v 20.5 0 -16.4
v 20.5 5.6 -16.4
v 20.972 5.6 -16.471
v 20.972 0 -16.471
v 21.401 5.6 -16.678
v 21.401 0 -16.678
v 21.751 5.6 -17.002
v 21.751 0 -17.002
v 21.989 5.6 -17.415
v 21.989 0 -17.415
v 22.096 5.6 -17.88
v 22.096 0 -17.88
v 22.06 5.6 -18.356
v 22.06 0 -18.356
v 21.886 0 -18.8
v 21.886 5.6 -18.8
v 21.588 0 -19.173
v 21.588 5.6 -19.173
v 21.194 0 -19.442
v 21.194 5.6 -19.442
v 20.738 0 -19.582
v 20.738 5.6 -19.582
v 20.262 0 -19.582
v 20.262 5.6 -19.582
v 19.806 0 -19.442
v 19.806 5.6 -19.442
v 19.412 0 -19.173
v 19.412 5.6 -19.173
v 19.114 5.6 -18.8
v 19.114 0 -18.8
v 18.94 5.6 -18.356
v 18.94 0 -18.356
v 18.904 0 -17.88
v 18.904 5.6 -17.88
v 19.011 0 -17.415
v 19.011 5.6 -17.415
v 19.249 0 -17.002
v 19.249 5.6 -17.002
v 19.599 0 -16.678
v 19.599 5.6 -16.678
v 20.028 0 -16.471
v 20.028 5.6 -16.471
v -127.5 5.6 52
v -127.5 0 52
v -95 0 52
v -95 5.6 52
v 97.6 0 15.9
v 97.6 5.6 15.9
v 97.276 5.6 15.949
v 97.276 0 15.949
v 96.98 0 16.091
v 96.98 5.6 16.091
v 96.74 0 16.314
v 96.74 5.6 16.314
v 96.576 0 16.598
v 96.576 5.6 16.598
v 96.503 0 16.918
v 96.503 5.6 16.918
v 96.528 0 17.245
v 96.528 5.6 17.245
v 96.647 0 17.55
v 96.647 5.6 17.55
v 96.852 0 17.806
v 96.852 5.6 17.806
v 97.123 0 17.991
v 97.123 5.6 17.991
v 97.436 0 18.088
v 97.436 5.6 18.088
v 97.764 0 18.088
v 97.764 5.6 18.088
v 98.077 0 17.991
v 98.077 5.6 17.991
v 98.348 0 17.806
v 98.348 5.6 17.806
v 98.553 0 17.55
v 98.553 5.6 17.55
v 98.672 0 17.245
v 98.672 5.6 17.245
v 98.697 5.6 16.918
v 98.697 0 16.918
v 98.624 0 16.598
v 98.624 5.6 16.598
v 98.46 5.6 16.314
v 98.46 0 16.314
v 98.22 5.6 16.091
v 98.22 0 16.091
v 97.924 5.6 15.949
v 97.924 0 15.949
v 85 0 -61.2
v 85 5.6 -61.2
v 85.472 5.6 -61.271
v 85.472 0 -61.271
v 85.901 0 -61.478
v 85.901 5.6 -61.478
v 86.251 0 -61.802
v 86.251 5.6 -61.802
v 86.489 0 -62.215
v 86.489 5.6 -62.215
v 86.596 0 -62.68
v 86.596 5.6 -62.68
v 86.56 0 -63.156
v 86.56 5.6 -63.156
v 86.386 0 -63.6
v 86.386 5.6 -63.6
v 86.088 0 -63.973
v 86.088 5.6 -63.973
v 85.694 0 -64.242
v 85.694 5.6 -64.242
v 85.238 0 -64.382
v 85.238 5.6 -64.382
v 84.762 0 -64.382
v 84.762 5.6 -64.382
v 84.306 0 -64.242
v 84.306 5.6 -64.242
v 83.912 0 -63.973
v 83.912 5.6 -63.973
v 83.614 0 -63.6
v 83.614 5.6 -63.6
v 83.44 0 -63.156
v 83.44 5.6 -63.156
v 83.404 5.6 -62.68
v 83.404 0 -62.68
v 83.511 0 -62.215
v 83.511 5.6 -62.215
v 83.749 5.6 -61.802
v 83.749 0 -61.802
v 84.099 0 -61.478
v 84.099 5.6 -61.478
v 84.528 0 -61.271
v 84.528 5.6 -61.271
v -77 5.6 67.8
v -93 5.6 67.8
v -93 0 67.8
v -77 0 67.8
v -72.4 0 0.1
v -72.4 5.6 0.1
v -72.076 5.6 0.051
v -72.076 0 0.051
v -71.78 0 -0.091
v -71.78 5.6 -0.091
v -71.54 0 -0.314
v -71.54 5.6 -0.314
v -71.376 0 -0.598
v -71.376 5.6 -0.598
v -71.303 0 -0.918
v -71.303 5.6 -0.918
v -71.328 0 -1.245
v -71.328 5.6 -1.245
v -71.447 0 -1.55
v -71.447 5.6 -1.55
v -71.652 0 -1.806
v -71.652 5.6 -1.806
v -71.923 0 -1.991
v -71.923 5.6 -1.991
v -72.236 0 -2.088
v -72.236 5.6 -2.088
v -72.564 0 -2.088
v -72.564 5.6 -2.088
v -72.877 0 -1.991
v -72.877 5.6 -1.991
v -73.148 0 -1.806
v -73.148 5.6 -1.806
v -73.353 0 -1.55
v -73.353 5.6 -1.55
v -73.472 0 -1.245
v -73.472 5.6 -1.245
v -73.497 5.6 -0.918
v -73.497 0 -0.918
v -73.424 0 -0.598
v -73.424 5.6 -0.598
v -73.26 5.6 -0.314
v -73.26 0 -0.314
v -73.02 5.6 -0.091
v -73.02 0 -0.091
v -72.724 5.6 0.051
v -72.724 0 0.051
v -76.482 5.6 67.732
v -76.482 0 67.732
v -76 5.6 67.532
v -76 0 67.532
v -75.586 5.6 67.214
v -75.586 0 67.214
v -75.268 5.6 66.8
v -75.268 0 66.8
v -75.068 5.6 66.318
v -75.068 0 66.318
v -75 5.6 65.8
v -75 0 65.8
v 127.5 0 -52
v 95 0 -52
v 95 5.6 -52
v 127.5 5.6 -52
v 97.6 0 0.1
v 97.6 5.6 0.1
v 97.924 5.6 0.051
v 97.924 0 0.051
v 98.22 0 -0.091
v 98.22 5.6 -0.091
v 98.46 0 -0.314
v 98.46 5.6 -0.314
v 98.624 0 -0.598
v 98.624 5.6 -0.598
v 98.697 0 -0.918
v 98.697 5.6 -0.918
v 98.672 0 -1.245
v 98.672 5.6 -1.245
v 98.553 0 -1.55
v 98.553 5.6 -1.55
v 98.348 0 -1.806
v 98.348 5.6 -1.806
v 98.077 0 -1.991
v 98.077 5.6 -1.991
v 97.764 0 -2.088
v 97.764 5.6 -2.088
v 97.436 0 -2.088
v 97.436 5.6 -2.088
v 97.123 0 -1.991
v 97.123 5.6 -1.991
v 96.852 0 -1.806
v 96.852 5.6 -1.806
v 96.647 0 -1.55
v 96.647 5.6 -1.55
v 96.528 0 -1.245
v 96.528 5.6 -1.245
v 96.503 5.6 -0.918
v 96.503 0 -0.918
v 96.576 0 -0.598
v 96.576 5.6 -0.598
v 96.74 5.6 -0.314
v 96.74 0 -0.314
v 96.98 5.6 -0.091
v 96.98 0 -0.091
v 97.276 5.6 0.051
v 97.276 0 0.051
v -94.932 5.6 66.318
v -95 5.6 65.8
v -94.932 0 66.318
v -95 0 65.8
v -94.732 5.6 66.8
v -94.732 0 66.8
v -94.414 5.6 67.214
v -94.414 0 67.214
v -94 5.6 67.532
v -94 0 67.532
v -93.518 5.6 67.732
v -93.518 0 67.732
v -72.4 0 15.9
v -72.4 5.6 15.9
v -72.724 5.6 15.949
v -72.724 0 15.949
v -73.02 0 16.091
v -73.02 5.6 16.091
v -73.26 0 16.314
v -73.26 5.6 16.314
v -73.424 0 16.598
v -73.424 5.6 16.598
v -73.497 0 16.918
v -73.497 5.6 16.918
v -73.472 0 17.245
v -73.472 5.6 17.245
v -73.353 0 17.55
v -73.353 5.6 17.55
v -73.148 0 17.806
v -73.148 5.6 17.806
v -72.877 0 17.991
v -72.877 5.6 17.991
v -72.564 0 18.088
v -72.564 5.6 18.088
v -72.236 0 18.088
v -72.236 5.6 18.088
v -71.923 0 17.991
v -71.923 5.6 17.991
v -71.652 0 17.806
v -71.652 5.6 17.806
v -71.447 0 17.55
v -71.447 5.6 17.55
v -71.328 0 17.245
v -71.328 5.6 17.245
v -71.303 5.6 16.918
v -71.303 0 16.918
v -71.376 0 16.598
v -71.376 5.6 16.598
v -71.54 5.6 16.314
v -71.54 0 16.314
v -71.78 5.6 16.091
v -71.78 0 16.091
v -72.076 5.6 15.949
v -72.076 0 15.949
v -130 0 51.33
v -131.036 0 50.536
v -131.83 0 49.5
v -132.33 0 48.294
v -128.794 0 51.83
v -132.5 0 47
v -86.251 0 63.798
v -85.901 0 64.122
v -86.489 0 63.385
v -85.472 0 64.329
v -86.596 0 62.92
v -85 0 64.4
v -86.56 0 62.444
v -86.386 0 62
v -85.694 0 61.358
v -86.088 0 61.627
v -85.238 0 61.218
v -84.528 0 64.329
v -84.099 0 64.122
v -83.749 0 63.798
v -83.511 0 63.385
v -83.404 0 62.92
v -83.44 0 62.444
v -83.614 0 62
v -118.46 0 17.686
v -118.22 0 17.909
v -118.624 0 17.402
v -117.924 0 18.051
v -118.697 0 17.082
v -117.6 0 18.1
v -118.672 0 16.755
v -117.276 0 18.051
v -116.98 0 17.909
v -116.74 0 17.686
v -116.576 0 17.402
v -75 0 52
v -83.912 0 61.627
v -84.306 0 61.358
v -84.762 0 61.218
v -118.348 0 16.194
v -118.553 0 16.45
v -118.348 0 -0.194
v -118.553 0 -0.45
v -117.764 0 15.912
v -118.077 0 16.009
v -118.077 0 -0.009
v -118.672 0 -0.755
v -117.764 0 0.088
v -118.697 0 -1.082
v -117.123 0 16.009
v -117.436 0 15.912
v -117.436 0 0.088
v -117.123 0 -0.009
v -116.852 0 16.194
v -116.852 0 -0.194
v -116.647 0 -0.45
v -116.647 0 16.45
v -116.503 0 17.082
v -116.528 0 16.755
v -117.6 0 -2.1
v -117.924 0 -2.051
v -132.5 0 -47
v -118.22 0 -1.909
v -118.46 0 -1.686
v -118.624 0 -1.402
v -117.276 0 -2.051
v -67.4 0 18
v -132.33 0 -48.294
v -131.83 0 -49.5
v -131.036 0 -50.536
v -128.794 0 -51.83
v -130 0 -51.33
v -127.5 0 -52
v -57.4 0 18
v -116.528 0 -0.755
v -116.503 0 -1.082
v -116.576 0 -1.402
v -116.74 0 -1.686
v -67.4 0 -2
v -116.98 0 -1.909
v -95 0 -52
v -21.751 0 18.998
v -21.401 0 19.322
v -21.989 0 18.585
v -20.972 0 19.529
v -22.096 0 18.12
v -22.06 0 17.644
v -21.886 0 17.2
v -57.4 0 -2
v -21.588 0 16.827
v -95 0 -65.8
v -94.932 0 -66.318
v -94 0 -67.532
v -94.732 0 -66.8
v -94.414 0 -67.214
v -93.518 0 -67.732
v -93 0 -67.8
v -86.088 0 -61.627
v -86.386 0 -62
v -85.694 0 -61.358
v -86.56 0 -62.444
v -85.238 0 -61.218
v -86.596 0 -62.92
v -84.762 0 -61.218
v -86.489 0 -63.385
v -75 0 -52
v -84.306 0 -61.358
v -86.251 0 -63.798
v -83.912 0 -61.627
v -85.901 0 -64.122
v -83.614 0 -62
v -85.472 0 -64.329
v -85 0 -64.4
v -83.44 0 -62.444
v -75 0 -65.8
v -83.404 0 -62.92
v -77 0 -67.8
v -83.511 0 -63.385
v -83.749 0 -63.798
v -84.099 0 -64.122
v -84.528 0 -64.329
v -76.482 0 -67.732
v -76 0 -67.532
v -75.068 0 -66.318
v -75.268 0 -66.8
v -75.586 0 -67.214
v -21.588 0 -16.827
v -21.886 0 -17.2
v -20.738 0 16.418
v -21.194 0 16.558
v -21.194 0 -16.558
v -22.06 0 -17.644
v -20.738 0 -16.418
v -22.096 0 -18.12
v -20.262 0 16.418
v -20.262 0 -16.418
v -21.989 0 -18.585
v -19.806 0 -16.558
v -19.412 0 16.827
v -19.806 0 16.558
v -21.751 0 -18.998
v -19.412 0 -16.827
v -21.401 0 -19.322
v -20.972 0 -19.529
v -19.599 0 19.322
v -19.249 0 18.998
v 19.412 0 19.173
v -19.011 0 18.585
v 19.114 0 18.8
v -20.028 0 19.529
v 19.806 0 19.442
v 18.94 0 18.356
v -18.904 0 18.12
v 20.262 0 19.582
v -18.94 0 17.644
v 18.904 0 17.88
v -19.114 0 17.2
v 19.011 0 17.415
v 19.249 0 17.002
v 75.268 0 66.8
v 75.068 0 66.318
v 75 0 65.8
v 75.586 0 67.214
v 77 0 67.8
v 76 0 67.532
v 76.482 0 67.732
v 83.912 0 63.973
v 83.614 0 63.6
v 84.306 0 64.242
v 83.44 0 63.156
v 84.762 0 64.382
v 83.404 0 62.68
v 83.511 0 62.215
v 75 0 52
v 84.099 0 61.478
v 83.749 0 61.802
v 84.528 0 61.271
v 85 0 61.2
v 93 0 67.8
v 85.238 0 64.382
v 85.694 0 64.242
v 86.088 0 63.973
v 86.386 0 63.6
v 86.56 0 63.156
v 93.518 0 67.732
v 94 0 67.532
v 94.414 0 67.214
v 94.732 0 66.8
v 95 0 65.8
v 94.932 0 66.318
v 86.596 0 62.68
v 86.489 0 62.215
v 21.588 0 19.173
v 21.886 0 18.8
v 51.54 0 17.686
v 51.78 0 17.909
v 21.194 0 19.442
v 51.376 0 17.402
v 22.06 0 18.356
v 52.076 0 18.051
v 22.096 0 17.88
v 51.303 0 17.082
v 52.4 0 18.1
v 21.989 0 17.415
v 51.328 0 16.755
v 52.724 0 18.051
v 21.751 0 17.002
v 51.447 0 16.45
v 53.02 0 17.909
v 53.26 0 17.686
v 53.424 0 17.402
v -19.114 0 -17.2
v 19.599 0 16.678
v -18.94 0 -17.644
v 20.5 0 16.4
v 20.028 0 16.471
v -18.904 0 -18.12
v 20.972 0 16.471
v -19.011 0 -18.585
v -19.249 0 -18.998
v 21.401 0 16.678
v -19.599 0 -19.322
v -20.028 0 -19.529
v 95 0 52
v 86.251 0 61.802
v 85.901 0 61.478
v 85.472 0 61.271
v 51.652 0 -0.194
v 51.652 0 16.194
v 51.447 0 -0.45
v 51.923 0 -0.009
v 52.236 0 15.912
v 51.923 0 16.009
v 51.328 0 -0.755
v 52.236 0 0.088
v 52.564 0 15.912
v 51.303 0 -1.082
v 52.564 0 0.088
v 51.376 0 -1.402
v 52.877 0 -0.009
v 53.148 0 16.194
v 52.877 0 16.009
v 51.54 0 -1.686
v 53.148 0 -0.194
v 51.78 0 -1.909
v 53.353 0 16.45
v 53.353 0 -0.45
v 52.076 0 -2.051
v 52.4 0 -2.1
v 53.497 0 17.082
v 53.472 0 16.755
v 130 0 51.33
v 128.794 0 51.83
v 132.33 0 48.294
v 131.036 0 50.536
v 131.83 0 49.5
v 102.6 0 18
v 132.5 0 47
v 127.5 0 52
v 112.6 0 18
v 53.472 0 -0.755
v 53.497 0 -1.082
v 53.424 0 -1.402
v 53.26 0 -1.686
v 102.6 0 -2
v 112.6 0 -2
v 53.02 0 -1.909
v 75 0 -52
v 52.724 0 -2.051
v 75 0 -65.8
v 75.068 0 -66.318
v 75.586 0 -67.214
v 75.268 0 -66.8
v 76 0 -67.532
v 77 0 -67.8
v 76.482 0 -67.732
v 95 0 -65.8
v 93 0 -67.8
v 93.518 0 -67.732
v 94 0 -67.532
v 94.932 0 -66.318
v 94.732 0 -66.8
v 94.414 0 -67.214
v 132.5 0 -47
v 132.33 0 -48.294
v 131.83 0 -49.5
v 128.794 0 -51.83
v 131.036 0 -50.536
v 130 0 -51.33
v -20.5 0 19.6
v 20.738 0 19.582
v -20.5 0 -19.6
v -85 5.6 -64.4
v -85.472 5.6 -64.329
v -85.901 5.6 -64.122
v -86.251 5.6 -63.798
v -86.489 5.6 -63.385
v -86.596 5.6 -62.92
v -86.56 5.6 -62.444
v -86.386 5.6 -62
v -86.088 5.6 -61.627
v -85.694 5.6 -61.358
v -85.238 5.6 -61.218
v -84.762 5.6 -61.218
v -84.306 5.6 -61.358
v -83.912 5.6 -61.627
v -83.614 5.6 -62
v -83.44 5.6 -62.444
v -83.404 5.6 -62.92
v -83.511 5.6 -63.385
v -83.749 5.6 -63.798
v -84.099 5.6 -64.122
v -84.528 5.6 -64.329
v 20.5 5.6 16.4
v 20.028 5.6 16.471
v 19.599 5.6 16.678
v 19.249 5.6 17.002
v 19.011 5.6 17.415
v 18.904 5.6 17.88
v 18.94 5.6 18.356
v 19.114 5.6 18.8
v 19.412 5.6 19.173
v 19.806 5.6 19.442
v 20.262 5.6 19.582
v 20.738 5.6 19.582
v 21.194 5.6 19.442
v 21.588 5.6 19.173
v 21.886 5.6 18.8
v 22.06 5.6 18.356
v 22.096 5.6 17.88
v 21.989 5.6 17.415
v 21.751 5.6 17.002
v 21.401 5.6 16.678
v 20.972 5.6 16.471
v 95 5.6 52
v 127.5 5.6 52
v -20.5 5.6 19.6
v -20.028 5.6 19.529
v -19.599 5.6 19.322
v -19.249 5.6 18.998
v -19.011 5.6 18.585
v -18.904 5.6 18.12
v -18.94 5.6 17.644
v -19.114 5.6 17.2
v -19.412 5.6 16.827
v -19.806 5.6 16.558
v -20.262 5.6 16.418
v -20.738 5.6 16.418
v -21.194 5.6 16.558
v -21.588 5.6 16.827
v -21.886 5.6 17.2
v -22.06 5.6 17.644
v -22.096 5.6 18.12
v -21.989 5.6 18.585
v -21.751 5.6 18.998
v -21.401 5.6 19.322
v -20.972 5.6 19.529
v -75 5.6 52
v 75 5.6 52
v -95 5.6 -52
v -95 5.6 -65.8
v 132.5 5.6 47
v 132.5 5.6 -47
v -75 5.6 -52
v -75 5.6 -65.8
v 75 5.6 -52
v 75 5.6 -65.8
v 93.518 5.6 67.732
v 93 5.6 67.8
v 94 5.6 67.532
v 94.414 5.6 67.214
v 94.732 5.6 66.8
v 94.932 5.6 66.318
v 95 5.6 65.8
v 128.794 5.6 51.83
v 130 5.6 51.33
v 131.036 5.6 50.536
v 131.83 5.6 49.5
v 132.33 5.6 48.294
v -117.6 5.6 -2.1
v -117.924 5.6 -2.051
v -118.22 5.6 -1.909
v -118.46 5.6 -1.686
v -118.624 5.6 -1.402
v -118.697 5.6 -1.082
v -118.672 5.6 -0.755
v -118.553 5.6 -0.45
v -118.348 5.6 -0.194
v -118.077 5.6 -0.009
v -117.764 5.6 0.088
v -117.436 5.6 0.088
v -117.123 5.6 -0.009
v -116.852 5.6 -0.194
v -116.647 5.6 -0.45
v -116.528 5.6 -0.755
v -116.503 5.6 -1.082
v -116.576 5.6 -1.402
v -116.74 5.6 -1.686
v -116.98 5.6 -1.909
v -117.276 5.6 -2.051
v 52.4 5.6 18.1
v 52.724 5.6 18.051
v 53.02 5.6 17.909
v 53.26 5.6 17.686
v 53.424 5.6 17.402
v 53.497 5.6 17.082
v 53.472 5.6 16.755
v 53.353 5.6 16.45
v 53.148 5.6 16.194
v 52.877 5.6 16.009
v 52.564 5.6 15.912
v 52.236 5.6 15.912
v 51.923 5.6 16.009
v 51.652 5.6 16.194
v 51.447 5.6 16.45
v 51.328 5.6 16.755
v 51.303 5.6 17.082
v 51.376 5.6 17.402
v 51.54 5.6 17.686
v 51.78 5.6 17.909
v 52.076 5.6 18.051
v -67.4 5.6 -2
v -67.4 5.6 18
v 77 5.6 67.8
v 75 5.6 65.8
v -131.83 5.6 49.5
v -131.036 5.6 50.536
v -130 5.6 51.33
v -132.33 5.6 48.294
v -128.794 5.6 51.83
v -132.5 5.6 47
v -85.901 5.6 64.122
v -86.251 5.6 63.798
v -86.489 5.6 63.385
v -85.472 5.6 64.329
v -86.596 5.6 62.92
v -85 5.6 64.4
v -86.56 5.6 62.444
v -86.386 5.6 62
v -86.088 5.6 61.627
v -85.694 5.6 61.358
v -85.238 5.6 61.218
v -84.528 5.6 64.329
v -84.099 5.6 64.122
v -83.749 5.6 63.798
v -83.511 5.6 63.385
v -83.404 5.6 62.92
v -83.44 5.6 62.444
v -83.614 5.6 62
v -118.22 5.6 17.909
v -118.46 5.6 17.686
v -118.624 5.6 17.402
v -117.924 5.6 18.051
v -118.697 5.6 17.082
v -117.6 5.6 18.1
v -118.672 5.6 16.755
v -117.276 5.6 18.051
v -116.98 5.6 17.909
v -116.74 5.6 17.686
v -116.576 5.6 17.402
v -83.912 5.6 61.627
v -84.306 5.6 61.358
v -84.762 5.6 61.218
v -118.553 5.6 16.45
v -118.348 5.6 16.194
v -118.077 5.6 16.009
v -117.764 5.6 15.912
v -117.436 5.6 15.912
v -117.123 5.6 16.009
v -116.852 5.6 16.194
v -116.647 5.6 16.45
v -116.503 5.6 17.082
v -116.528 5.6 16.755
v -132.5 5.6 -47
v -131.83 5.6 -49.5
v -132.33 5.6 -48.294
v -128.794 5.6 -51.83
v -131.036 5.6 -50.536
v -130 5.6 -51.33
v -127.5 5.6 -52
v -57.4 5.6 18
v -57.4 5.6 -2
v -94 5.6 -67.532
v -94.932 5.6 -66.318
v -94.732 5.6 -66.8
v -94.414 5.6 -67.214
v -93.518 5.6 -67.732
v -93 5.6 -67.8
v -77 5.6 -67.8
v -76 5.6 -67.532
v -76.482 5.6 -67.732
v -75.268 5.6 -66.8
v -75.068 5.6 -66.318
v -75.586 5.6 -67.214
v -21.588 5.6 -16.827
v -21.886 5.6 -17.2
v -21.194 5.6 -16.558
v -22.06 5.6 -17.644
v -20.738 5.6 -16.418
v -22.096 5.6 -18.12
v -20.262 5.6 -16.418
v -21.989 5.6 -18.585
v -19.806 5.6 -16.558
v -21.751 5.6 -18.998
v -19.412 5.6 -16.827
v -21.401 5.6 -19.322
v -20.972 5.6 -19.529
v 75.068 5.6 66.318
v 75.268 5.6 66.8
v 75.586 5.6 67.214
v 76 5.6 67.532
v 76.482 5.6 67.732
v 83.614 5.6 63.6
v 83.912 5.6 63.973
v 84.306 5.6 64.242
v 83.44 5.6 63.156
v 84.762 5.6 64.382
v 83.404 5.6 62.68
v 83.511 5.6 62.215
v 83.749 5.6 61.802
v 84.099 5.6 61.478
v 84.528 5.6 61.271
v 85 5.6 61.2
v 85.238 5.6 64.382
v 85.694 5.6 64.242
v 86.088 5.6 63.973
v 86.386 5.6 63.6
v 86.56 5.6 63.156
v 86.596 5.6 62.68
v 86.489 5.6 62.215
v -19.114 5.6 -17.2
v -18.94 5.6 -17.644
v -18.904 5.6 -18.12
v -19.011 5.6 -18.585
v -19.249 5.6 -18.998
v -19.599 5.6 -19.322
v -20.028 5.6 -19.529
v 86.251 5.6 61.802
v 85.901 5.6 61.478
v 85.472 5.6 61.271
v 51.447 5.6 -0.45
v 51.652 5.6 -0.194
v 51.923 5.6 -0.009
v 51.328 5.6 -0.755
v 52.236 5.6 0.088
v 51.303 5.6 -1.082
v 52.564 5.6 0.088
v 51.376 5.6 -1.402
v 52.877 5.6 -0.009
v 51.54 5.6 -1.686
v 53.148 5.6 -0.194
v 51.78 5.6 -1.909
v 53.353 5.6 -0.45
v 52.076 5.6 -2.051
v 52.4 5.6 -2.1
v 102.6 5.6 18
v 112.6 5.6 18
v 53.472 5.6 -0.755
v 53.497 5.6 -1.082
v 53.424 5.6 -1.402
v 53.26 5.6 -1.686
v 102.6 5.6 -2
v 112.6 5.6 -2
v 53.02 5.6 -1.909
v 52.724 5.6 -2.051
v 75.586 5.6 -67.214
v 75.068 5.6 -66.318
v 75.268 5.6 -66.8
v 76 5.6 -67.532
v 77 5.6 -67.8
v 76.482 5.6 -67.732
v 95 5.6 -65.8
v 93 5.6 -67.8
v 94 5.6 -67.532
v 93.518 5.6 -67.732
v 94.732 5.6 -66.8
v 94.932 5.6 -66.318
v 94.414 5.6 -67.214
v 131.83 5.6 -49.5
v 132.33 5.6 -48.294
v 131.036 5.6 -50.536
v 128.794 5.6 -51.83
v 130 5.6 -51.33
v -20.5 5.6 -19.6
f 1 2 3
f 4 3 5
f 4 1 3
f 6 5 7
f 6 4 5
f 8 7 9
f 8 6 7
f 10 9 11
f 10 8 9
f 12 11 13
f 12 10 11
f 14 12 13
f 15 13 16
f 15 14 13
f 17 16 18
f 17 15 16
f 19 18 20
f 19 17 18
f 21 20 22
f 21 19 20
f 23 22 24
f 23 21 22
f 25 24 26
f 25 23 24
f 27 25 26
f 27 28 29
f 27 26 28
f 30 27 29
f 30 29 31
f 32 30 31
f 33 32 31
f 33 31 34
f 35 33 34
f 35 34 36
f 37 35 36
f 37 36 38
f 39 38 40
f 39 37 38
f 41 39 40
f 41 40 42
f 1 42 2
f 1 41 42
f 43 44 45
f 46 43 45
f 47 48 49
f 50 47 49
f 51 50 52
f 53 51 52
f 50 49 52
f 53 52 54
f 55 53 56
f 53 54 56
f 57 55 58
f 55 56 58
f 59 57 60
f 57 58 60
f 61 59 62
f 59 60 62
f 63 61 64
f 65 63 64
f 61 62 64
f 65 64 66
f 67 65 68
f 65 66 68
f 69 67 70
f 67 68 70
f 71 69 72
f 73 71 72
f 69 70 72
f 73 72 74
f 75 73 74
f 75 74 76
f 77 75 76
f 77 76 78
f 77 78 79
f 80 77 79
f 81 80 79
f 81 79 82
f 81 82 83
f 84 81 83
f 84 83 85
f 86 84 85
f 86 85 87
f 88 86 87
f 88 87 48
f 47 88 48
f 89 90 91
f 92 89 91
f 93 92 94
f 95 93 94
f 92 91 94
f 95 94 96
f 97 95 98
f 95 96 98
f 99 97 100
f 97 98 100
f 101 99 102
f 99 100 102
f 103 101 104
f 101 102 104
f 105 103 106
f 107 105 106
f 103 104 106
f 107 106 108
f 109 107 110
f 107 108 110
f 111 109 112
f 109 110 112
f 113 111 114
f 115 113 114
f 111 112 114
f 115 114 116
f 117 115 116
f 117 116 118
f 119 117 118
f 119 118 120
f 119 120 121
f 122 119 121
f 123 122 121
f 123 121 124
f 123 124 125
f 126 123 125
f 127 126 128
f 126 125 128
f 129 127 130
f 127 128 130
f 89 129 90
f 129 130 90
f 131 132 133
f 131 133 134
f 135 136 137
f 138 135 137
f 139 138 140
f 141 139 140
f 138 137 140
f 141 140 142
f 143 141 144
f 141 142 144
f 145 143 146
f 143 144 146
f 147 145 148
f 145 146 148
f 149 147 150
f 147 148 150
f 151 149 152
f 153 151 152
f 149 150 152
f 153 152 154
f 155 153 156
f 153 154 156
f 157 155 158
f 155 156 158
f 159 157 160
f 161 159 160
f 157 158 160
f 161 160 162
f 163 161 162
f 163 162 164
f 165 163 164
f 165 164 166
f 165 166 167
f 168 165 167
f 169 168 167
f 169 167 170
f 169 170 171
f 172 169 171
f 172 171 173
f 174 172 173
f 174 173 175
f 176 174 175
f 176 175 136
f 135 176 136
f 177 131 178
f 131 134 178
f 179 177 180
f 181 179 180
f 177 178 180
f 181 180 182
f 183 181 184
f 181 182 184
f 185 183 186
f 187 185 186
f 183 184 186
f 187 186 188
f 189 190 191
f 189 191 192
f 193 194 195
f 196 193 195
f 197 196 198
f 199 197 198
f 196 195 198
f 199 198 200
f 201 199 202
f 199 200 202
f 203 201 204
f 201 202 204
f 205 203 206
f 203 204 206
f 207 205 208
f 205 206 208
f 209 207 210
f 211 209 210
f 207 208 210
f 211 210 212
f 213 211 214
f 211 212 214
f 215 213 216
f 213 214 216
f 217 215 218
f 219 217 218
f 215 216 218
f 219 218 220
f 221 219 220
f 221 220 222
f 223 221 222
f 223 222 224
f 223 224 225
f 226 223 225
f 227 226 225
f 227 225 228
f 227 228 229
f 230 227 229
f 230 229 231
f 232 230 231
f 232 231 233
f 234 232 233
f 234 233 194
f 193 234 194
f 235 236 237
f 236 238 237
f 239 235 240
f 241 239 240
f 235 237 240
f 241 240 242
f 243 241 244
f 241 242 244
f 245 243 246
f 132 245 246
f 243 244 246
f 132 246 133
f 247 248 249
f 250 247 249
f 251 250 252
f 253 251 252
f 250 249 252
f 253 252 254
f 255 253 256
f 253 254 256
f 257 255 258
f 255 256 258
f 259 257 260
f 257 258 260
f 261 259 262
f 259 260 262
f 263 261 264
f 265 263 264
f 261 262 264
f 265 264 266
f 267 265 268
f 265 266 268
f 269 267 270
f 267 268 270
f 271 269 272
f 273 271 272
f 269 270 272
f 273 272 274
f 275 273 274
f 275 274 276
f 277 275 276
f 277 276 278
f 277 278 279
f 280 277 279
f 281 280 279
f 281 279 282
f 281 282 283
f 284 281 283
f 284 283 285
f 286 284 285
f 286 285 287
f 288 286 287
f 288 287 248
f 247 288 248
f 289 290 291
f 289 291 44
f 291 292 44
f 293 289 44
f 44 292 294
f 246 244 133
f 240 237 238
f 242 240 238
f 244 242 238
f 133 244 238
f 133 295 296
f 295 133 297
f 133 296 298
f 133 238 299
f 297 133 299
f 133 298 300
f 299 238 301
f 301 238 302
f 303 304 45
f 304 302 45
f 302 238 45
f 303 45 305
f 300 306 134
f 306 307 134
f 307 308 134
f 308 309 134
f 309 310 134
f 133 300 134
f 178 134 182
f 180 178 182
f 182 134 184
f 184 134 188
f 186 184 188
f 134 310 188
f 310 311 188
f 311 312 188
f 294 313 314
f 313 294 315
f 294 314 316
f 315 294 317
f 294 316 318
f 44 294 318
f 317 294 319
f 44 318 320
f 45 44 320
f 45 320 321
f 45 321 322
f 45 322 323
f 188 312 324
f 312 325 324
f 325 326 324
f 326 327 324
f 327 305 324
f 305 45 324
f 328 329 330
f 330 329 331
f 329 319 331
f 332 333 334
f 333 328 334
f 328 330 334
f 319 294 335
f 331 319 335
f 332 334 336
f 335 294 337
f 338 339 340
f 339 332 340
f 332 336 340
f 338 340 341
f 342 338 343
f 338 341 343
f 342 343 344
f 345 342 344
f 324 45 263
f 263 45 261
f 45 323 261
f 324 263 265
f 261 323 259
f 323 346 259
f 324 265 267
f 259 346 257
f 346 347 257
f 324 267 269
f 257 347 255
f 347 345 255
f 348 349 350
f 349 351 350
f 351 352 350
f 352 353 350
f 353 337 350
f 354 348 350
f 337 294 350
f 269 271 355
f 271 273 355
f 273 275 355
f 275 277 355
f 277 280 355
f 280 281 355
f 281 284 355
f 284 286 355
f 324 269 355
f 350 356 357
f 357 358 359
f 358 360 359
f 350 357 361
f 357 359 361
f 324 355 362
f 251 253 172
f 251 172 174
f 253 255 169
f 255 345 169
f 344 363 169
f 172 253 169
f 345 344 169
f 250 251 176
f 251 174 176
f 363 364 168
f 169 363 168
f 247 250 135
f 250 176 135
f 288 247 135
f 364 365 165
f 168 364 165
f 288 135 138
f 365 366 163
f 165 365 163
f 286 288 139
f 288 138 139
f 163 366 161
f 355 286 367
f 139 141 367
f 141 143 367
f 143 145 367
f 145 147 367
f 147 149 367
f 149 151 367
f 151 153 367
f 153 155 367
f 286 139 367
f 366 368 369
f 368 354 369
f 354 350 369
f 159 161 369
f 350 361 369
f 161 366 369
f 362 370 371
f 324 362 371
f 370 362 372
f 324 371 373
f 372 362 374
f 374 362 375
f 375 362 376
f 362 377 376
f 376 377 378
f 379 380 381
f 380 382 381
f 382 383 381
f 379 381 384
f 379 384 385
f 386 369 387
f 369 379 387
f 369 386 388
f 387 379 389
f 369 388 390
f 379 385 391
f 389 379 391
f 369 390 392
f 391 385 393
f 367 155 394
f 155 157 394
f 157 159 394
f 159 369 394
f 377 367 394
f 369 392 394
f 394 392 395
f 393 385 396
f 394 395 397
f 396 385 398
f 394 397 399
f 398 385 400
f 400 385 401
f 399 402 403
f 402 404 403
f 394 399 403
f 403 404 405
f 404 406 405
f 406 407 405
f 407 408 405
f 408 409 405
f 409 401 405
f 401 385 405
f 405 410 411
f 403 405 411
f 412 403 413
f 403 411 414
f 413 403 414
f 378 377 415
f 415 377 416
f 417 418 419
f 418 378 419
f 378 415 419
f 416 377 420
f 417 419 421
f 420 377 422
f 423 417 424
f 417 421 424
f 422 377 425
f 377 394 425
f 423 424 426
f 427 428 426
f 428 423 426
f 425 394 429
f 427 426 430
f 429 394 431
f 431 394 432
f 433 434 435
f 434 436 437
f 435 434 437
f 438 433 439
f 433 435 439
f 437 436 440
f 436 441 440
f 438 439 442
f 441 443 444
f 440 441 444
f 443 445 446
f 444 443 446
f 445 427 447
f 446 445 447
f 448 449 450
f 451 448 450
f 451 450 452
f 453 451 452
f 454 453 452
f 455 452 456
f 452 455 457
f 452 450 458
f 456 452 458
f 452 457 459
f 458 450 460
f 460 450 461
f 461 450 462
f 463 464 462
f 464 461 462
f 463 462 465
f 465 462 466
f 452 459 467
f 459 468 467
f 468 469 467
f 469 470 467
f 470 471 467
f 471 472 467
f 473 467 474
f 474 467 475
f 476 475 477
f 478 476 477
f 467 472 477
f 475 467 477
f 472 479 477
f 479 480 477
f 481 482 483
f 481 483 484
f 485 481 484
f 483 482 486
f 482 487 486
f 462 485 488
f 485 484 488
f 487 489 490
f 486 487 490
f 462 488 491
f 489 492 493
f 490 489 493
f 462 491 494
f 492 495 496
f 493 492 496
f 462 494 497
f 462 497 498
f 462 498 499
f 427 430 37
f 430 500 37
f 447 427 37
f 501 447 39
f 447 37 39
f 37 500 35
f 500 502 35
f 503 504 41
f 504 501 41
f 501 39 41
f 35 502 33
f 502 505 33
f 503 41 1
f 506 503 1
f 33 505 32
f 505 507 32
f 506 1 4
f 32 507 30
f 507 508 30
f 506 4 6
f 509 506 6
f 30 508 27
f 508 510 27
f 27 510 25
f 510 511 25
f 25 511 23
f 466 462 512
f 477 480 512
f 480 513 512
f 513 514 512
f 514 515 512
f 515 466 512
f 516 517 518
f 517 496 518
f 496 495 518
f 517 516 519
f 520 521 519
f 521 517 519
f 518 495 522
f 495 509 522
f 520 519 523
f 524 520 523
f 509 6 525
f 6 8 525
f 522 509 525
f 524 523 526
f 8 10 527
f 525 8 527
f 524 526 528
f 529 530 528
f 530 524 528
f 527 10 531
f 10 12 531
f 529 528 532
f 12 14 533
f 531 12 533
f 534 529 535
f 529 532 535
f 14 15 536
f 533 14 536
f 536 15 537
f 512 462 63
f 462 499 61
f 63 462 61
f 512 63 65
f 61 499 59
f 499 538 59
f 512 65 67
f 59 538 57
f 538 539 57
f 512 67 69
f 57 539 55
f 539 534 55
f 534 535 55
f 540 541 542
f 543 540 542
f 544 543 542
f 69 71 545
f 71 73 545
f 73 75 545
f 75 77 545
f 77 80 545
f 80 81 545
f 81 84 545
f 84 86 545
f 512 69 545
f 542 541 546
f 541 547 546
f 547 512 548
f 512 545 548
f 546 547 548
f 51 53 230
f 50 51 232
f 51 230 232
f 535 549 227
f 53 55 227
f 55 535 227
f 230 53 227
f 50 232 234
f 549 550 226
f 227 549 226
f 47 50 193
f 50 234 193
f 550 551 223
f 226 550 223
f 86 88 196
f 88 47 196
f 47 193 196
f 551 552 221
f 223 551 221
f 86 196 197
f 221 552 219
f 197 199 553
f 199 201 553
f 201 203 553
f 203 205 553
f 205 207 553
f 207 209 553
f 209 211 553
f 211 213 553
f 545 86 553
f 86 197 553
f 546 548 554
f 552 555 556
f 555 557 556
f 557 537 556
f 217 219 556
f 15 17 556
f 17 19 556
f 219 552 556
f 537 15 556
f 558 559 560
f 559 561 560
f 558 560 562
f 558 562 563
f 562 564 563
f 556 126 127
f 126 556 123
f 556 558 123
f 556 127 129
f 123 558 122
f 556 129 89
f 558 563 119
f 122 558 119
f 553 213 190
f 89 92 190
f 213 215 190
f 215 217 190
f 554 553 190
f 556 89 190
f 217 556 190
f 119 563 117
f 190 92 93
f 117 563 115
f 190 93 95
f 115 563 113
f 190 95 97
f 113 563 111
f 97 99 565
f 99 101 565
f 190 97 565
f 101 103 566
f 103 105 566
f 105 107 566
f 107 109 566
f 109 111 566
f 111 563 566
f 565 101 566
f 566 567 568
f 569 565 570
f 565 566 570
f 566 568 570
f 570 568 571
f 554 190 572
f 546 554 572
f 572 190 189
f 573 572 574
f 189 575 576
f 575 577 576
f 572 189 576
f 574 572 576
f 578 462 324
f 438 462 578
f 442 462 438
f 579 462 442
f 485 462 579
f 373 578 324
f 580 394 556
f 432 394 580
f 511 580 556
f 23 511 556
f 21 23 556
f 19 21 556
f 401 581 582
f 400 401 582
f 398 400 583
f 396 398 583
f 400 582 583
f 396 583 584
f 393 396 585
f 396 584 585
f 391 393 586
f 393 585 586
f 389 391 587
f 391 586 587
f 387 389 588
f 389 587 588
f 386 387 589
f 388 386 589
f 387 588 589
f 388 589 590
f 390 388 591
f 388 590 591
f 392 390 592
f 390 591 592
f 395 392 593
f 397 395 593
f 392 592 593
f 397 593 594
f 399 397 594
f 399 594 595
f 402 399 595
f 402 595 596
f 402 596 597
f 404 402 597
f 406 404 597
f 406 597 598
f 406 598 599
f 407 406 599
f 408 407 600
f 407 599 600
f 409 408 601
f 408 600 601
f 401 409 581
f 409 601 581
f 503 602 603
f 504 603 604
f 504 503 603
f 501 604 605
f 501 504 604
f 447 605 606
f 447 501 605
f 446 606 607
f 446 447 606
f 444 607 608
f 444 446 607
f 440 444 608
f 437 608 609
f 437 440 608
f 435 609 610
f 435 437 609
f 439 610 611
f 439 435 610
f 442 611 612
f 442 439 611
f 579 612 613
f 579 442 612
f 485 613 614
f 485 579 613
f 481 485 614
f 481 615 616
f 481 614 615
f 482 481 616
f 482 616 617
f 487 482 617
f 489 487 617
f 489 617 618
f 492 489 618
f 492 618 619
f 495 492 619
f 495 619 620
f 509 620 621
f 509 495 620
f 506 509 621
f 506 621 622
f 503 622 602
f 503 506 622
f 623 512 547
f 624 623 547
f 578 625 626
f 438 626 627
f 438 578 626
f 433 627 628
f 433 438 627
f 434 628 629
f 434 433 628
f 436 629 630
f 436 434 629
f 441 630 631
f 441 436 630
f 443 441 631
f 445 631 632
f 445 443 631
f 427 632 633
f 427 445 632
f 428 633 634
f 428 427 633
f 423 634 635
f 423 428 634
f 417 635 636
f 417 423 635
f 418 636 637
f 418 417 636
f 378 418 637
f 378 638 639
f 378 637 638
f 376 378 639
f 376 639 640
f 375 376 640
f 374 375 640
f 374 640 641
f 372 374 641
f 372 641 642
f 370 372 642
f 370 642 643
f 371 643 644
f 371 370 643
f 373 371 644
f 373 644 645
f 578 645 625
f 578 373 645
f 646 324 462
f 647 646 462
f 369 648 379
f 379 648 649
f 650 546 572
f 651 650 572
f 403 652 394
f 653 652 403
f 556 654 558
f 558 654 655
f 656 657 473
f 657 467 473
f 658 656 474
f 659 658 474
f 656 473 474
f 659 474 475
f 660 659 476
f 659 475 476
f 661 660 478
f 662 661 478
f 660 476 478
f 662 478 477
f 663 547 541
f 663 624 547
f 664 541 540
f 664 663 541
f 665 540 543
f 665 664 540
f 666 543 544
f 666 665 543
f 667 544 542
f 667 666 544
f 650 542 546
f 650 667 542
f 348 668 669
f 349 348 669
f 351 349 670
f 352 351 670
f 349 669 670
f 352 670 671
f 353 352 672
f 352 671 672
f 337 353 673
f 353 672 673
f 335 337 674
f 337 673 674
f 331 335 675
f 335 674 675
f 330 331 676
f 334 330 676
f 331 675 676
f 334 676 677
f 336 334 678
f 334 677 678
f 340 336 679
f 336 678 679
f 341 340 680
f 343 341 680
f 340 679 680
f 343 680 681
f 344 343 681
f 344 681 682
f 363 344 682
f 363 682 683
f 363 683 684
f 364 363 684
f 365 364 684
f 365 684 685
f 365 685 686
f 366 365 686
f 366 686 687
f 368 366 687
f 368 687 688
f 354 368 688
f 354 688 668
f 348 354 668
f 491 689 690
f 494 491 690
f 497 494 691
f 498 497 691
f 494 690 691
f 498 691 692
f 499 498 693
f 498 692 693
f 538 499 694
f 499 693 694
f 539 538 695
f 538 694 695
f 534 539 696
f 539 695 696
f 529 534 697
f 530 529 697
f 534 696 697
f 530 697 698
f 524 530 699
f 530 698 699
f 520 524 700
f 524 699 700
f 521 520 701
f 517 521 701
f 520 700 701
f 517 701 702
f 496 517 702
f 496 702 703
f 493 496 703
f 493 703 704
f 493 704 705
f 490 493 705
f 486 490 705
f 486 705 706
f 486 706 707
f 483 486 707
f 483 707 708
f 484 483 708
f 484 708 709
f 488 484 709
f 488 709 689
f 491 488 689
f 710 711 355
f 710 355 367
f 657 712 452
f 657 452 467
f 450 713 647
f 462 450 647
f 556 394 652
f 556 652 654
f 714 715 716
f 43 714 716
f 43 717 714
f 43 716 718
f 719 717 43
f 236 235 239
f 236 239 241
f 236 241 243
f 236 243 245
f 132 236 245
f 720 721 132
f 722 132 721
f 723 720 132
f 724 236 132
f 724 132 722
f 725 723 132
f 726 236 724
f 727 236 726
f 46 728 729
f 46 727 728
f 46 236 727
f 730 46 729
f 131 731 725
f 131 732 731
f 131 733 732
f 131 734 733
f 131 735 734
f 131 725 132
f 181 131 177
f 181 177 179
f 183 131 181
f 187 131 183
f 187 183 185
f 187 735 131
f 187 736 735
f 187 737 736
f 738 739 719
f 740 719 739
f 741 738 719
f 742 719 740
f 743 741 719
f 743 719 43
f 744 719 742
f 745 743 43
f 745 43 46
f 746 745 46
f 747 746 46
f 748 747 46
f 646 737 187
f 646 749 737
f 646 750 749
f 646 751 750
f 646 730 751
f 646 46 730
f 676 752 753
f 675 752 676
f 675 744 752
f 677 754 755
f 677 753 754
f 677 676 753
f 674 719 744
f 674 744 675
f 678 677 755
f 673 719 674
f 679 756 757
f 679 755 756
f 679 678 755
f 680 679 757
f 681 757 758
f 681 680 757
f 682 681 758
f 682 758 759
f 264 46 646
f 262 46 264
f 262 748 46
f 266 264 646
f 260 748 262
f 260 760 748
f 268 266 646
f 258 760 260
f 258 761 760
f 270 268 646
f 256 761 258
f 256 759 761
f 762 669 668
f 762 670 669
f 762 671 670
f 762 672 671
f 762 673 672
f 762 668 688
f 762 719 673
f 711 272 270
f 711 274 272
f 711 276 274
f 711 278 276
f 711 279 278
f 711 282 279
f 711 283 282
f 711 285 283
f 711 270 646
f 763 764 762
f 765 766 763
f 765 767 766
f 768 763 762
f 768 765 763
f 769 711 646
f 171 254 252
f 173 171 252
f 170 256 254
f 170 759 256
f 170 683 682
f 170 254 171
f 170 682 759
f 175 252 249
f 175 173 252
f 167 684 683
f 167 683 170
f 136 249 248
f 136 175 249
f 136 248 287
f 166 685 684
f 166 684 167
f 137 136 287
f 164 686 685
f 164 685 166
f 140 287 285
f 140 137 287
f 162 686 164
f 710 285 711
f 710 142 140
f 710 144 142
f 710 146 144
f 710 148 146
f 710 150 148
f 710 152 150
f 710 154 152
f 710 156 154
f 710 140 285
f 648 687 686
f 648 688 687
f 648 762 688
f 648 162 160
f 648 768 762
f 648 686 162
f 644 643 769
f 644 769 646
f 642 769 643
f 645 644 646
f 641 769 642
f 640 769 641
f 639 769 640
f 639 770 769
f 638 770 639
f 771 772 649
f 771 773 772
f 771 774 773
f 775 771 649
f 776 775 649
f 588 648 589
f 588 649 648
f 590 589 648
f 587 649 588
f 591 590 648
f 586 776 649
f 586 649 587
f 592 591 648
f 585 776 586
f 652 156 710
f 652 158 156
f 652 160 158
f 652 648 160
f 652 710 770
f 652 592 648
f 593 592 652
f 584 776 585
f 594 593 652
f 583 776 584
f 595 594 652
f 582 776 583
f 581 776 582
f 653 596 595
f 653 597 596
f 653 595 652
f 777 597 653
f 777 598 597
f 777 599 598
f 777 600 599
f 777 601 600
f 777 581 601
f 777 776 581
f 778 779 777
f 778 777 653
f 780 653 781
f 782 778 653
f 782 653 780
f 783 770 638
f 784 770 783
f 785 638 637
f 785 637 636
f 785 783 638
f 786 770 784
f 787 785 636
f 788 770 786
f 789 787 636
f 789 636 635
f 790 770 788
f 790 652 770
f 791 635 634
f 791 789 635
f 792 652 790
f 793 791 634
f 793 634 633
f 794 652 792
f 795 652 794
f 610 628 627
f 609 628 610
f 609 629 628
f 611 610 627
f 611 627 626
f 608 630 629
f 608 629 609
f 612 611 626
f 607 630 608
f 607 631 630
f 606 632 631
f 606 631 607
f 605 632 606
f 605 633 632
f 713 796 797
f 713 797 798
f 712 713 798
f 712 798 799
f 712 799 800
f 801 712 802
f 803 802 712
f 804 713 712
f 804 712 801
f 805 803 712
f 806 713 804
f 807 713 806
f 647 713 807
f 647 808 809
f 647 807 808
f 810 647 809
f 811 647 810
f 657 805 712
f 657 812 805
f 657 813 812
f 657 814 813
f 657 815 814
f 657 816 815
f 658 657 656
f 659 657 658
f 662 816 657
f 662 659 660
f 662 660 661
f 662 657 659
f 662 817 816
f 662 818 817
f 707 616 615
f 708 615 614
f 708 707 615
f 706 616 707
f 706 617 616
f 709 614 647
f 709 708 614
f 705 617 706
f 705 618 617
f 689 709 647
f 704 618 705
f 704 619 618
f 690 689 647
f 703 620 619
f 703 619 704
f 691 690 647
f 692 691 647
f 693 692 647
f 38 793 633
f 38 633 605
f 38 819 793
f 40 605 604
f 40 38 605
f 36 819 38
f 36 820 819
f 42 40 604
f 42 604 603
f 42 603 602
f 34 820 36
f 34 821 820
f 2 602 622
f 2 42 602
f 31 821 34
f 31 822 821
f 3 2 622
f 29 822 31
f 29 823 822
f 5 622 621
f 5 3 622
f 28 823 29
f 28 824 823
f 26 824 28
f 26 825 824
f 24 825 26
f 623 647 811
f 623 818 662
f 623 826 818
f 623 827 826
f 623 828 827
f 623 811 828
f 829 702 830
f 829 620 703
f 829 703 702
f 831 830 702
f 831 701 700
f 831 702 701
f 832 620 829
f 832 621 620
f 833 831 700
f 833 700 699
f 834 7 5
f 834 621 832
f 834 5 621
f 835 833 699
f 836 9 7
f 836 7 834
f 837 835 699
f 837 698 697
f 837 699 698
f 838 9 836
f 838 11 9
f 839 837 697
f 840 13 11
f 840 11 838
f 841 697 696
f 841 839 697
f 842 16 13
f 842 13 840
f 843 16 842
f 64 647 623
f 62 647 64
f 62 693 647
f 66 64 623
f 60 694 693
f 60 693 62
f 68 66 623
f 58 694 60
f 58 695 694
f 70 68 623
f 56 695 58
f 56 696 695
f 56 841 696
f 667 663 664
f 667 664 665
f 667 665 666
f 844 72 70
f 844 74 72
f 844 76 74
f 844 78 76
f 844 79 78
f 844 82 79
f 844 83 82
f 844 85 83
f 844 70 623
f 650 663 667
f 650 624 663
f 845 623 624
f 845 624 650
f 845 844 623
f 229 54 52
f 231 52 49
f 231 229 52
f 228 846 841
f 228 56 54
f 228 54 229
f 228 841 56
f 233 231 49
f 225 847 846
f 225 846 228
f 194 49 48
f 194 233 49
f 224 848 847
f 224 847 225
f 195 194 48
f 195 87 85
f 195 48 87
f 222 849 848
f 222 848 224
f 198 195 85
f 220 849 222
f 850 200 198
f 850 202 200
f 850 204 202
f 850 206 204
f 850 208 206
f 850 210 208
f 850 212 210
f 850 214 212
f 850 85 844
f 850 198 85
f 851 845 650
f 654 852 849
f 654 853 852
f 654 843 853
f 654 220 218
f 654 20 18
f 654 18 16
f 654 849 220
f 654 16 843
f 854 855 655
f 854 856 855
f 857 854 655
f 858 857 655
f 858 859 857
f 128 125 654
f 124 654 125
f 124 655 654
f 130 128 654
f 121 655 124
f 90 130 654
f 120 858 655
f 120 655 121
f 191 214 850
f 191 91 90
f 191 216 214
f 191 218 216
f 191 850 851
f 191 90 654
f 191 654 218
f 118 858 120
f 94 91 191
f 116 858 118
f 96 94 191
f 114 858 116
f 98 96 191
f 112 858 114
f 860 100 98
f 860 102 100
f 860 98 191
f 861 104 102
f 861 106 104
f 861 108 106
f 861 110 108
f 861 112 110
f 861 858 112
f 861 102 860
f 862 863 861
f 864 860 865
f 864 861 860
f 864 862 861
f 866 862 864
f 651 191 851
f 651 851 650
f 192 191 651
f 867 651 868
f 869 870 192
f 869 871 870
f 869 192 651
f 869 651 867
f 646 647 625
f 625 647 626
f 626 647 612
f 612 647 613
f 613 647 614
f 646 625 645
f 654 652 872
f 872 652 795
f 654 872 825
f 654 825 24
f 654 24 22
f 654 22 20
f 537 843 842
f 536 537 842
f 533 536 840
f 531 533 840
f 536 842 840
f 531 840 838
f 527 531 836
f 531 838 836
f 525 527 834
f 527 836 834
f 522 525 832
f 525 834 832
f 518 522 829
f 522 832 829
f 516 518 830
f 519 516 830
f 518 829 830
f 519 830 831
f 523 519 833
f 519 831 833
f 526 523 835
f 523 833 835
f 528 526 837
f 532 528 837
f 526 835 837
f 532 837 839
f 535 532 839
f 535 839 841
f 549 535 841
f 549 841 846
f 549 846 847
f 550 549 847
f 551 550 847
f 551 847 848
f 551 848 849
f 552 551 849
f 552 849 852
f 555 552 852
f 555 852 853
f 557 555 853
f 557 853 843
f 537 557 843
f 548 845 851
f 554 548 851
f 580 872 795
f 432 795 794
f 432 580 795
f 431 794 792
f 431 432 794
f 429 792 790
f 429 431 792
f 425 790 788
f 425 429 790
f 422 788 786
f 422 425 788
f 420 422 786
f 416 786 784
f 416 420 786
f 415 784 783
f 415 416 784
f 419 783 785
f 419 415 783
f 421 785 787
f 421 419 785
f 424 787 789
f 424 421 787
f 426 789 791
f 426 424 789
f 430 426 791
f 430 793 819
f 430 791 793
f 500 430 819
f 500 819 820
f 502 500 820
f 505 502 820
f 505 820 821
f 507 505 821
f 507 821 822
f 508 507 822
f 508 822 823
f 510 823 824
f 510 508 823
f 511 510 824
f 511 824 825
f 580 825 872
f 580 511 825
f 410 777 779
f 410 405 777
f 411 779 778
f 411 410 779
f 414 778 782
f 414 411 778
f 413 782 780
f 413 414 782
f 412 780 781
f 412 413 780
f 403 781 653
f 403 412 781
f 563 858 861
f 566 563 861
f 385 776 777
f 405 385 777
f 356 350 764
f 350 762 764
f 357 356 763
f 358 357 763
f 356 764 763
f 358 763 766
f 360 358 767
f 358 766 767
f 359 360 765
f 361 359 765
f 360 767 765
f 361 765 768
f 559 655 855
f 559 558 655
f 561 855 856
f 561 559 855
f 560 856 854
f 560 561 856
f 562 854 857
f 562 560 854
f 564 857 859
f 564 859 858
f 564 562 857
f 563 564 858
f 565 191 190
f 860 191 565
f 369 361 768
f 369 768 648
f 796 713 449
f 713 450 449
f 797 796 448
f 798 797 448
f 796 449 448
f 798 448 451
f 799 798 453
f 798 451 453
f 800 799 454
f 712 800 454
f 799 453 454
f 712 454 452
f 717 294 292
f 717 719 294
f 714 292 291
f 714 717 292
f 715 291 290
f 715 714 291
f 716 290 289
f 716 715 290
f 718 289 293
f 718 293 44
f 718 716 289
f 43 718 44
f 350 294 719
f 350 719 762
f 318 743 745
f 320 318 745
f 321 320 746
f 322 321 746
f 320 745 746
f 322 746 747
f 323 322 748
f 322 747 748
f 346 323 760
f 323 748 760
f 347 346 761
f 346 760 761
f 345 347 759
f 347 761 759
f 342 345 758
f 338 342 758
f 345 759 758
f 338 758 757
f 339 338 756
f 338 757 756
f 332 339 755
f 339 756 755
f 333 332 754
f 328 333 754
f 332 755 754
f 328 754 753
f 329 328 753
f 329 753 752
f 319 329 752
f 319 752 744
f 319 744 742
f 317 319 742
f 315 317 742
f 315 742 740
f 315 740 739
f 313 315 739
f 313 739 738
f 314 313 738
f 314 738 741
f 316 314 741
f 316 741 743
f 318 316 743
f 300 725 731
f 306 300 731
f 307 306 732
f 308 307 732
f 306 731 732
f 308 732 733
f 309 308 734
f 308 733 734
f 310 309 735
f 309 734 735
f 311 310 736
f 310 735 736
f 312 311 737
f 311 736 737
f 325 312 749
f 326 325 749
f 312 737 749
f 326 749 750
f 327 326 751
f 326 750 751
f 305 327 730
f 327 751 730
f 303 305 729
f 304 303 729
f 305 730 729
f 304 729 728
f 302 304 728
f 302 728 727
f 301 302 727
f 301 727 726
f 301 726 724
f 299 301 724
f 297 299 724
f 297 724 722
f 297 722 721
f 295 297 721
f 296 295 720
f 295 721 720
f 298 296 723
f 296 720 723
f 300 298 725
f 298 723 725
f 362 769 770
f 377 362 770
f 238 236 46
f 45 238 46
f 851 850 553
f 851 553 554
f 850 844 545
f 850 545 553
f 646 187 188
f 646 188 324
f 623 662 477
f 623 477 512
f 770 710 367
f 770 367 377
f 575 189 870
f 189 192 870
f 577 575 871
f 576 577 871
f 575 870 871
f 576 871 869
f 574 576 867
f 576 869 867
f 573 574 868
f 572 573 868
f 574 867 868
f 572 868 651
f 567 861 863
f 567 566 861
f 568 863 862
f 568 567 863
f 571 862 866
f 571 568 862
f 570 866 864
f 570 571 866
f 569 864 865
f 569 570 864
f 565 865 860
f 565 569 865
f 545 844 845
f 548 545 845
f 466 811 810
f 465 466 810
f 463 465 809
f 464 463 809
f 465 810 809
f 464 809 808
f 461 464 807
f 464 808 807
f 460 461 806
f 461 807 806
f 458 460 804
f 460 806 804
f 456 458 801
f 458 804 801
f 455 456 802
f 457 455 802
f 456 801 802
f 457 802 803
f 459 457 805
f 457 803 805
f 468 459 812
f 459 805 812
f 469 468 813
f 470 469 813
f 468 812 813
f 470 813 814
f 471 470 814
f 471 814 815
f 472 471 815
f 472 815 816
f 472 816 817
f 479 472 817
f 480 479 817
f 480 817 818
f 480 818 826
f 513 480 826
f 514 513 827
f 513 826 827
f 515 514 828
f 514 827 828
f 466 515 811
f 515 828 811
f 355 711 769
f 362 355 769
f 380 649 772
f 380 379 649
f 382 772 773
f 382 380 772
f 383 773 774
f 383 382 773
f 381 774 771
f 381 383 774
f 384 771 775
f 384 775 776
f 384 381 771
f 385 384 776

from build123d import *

# Parameters (mm, degrees)
SKETCH_1_W          = 265
SKETCH_1_H          = 104
EXTRUDE_1_DEPTH     = 5.6
SKETCH_2_R          = 1.6
CUT_EXTRUDE_4_DEPTH = 143.448622317
SKETCH_4_R          = 1.1
SKETCH_4_W          = 10
SKETCH_4_H          = 20
CUT_EXTRUDE_6_DEPTH = 143.448622317
SKETCH_5_W          = 20
SKETCH_5_H          = 15.8
SKETCH_5_R          = 1.6
EXTRUDE_2_DEPTH     = 5.6
FILLET_1_R          = 5
FILLET_2_R          = 2


with BuildPart() as part:
    # ｽｹｯﾁ1 → ﾎﾞｽ - 押し出し1 (new body)
    with BuildSketch(Plane(origin=(0, 0, 0), x_dir=(1, 0, 0), z_dir=(0, 1, 0))):
        Rectangle(SKETCH_1_W, SKETCH_1_H)
    extrude(amount=EXTRUDE_1_DEPTH)

    # ｽｹｯﾁ2 → ｶｯﾄ - 押し出し4 (cut, through all)
    with BuildSketch(Plane(origin=(0, 0, 0), x_dir=(1, 0, 0), z_dir=(0, 1, 0))):
        with Locations(Location((20.5, 18, 0), (0, 0, 270))):
            Circle(SKETCH_2_R)
        with Locations(Location((20.5, -18, 0), (0, 0, 90))):
            Circle(SKETCH_2_R)
        with Locations(Location((-20.5, -18, 0), (0, 0, 270))):
            Circle(SKETCH_2_R)
        with Locations(Location((-20.5, 18, 0), (0, 0, 90))):
            Circle(SKETCH_2_R)
    extrude(amount=CUT_EXTRUDE_4_DEPTH, mode=Mode.SUBTRACT)

    # ｽｹｯﾁ4 → ｶｯﾄ - 押し出し6 (cut, through all)
    with BuildSketch(Plane(origin=(0, 5.6, 0), x_dir=(1, 0, 0), z_dir=(0, 1, 0))):
        with Locations(Location((97.6, 1, 0), (0, 0, 270))):
            Circle(SKETCH_4_R)
        with Locations(Location((97.6, -17, 0), (0, 0, 90))):
            Circle(SKETCH_4_R)
        with Locations(Location((52.4, 1, 0), (0, 0, 90))):
            Circle(SKETCH_4_R)
        with Locations(Location((52.4, -17, 0), (0, 0, 270))):
            Circle(SKETCH_4_R)
        with Locations(Location((-72.4, 1, 0), (0, 0, 270))):
            Circle(SKETCH_4_R)
        with Locations(Location((-72.4, -17, 0), (0, 0, 90))):
            Circle(SKETCH_4_R)
        with Locations(Location((-117.6, 1, 0), (0, 0, 90))):
            Circle(SKETCH_4_R)
        with Locations(Location((-117.6, -17, 0), (0, 0, 270))):
            Circle(SKETCH_4_R)
        with Locations((-62.4, -8)):
            Rectangle(SKETCH_4_W, SKETCH_4_H)
        with Locations((107.6, -8)):
            Rectangle(SKETCH_4_W, SKETCH_4_H)
    extrude(amount=-CUT_EXTRUDE_6_DEPTH, mode=Mode.SUBTRACT)

    # ｽｹｯﾁ5 → ﾎﾞｽ - 押し出し2 (add)
    # profile 1 of 4: a face of its own
    with BuildSketch(Plane(origin=(0, 5.6, 0), x_dir=(1, 0, 0), z_dir=(0, 1, 0))):
        with Locations((85, 59.9)):
            Rectangle(SKETCH_5_W, SKETCH_5_H)
        with Locations(Location((85, 62.8, 0), (0, 0, 270))):
            Circle(SKETCH_5_R, mode=Mode.SUBTRACT)
    # profile 2 of 4: a face of its own
    with BuildSketch(Plane(origin=(0, 5.6, 0), x_dir=(1, 0, 0), z_dir=(0, 1, 0))):
        with Locations((-85, 59.9)):
            Rectangle(SKETCH_5_W, SKETCH_5_H)
        with Locations(Location((-85, 62.8, 0), (0, 0, 90))):
            Circle(SKETCH_5_R, mode=Mode.SUBTRACT)
    # profile 3 of 4: a face of its own
    with BuildSketch(Plane(origin=(0, 5.6, 0), x_dir=(1, 0, 0), z_dir=(0, 1, 0))):
        with Locations((85, -59.9)):
            Rectangle(SKETCH_5_W, SKETCH_5_H)
        with Locations(Location((85, -62.8, 0), (0, 0, 90))):
            Circle(SKETCH_5_R, mode=Mode.SUBTRACT)
    # profile 4 of 4: a face of its own
    with BuildSketch(Plane(origin=(0, 5.6, 0), x_dir=(1, 0, 0), z_dir=(0, 1, 0))):
        with Locations((-85, -59.9)):
            Rectangle(SKETCH_5_W, SKETCH_5_H)
        with Locations(Location((-85, -62.8, 0), (0, 0, 270))):
            Circle(SKETCH_5_R, mode=Mode.SUBTRACT)
    extrude(amount=-EXTRUDE_2_DEPTH)

    # ﾌｨﾚｯﾄ1
    fillet_1_edges = [part.edges().sort_by_distance(p)[0] for p in [
        (132.5, 2.8, 52),
        (-132.5, 2.8, 52),
        (-132.5, 2.8, -52),
        (132.5, 2.8, -52),
    ]]
    fillet(fillet_1_edges, radius=FILLET_1_R)

    # ﾌｨﾚｯﾄ2
    fillet_2_edges = [part.edges().sort_by_distance(p)[0] for p in [
        (-95, 2.8, -67.8),
        (-75, 2.8, -67.8),
        (95, 2.8, 67.8),
        (75, 2.8, 67.8),
        (-75, 2.8, 67.8),
        (-95, 2.8, 67.8),
        (75, 2.8, -67.8),
        (95, 2.8, -67.8),
    ]]
    fillet(fillet_2_edges, radius=FILLET_2_R)


solid = part.part
